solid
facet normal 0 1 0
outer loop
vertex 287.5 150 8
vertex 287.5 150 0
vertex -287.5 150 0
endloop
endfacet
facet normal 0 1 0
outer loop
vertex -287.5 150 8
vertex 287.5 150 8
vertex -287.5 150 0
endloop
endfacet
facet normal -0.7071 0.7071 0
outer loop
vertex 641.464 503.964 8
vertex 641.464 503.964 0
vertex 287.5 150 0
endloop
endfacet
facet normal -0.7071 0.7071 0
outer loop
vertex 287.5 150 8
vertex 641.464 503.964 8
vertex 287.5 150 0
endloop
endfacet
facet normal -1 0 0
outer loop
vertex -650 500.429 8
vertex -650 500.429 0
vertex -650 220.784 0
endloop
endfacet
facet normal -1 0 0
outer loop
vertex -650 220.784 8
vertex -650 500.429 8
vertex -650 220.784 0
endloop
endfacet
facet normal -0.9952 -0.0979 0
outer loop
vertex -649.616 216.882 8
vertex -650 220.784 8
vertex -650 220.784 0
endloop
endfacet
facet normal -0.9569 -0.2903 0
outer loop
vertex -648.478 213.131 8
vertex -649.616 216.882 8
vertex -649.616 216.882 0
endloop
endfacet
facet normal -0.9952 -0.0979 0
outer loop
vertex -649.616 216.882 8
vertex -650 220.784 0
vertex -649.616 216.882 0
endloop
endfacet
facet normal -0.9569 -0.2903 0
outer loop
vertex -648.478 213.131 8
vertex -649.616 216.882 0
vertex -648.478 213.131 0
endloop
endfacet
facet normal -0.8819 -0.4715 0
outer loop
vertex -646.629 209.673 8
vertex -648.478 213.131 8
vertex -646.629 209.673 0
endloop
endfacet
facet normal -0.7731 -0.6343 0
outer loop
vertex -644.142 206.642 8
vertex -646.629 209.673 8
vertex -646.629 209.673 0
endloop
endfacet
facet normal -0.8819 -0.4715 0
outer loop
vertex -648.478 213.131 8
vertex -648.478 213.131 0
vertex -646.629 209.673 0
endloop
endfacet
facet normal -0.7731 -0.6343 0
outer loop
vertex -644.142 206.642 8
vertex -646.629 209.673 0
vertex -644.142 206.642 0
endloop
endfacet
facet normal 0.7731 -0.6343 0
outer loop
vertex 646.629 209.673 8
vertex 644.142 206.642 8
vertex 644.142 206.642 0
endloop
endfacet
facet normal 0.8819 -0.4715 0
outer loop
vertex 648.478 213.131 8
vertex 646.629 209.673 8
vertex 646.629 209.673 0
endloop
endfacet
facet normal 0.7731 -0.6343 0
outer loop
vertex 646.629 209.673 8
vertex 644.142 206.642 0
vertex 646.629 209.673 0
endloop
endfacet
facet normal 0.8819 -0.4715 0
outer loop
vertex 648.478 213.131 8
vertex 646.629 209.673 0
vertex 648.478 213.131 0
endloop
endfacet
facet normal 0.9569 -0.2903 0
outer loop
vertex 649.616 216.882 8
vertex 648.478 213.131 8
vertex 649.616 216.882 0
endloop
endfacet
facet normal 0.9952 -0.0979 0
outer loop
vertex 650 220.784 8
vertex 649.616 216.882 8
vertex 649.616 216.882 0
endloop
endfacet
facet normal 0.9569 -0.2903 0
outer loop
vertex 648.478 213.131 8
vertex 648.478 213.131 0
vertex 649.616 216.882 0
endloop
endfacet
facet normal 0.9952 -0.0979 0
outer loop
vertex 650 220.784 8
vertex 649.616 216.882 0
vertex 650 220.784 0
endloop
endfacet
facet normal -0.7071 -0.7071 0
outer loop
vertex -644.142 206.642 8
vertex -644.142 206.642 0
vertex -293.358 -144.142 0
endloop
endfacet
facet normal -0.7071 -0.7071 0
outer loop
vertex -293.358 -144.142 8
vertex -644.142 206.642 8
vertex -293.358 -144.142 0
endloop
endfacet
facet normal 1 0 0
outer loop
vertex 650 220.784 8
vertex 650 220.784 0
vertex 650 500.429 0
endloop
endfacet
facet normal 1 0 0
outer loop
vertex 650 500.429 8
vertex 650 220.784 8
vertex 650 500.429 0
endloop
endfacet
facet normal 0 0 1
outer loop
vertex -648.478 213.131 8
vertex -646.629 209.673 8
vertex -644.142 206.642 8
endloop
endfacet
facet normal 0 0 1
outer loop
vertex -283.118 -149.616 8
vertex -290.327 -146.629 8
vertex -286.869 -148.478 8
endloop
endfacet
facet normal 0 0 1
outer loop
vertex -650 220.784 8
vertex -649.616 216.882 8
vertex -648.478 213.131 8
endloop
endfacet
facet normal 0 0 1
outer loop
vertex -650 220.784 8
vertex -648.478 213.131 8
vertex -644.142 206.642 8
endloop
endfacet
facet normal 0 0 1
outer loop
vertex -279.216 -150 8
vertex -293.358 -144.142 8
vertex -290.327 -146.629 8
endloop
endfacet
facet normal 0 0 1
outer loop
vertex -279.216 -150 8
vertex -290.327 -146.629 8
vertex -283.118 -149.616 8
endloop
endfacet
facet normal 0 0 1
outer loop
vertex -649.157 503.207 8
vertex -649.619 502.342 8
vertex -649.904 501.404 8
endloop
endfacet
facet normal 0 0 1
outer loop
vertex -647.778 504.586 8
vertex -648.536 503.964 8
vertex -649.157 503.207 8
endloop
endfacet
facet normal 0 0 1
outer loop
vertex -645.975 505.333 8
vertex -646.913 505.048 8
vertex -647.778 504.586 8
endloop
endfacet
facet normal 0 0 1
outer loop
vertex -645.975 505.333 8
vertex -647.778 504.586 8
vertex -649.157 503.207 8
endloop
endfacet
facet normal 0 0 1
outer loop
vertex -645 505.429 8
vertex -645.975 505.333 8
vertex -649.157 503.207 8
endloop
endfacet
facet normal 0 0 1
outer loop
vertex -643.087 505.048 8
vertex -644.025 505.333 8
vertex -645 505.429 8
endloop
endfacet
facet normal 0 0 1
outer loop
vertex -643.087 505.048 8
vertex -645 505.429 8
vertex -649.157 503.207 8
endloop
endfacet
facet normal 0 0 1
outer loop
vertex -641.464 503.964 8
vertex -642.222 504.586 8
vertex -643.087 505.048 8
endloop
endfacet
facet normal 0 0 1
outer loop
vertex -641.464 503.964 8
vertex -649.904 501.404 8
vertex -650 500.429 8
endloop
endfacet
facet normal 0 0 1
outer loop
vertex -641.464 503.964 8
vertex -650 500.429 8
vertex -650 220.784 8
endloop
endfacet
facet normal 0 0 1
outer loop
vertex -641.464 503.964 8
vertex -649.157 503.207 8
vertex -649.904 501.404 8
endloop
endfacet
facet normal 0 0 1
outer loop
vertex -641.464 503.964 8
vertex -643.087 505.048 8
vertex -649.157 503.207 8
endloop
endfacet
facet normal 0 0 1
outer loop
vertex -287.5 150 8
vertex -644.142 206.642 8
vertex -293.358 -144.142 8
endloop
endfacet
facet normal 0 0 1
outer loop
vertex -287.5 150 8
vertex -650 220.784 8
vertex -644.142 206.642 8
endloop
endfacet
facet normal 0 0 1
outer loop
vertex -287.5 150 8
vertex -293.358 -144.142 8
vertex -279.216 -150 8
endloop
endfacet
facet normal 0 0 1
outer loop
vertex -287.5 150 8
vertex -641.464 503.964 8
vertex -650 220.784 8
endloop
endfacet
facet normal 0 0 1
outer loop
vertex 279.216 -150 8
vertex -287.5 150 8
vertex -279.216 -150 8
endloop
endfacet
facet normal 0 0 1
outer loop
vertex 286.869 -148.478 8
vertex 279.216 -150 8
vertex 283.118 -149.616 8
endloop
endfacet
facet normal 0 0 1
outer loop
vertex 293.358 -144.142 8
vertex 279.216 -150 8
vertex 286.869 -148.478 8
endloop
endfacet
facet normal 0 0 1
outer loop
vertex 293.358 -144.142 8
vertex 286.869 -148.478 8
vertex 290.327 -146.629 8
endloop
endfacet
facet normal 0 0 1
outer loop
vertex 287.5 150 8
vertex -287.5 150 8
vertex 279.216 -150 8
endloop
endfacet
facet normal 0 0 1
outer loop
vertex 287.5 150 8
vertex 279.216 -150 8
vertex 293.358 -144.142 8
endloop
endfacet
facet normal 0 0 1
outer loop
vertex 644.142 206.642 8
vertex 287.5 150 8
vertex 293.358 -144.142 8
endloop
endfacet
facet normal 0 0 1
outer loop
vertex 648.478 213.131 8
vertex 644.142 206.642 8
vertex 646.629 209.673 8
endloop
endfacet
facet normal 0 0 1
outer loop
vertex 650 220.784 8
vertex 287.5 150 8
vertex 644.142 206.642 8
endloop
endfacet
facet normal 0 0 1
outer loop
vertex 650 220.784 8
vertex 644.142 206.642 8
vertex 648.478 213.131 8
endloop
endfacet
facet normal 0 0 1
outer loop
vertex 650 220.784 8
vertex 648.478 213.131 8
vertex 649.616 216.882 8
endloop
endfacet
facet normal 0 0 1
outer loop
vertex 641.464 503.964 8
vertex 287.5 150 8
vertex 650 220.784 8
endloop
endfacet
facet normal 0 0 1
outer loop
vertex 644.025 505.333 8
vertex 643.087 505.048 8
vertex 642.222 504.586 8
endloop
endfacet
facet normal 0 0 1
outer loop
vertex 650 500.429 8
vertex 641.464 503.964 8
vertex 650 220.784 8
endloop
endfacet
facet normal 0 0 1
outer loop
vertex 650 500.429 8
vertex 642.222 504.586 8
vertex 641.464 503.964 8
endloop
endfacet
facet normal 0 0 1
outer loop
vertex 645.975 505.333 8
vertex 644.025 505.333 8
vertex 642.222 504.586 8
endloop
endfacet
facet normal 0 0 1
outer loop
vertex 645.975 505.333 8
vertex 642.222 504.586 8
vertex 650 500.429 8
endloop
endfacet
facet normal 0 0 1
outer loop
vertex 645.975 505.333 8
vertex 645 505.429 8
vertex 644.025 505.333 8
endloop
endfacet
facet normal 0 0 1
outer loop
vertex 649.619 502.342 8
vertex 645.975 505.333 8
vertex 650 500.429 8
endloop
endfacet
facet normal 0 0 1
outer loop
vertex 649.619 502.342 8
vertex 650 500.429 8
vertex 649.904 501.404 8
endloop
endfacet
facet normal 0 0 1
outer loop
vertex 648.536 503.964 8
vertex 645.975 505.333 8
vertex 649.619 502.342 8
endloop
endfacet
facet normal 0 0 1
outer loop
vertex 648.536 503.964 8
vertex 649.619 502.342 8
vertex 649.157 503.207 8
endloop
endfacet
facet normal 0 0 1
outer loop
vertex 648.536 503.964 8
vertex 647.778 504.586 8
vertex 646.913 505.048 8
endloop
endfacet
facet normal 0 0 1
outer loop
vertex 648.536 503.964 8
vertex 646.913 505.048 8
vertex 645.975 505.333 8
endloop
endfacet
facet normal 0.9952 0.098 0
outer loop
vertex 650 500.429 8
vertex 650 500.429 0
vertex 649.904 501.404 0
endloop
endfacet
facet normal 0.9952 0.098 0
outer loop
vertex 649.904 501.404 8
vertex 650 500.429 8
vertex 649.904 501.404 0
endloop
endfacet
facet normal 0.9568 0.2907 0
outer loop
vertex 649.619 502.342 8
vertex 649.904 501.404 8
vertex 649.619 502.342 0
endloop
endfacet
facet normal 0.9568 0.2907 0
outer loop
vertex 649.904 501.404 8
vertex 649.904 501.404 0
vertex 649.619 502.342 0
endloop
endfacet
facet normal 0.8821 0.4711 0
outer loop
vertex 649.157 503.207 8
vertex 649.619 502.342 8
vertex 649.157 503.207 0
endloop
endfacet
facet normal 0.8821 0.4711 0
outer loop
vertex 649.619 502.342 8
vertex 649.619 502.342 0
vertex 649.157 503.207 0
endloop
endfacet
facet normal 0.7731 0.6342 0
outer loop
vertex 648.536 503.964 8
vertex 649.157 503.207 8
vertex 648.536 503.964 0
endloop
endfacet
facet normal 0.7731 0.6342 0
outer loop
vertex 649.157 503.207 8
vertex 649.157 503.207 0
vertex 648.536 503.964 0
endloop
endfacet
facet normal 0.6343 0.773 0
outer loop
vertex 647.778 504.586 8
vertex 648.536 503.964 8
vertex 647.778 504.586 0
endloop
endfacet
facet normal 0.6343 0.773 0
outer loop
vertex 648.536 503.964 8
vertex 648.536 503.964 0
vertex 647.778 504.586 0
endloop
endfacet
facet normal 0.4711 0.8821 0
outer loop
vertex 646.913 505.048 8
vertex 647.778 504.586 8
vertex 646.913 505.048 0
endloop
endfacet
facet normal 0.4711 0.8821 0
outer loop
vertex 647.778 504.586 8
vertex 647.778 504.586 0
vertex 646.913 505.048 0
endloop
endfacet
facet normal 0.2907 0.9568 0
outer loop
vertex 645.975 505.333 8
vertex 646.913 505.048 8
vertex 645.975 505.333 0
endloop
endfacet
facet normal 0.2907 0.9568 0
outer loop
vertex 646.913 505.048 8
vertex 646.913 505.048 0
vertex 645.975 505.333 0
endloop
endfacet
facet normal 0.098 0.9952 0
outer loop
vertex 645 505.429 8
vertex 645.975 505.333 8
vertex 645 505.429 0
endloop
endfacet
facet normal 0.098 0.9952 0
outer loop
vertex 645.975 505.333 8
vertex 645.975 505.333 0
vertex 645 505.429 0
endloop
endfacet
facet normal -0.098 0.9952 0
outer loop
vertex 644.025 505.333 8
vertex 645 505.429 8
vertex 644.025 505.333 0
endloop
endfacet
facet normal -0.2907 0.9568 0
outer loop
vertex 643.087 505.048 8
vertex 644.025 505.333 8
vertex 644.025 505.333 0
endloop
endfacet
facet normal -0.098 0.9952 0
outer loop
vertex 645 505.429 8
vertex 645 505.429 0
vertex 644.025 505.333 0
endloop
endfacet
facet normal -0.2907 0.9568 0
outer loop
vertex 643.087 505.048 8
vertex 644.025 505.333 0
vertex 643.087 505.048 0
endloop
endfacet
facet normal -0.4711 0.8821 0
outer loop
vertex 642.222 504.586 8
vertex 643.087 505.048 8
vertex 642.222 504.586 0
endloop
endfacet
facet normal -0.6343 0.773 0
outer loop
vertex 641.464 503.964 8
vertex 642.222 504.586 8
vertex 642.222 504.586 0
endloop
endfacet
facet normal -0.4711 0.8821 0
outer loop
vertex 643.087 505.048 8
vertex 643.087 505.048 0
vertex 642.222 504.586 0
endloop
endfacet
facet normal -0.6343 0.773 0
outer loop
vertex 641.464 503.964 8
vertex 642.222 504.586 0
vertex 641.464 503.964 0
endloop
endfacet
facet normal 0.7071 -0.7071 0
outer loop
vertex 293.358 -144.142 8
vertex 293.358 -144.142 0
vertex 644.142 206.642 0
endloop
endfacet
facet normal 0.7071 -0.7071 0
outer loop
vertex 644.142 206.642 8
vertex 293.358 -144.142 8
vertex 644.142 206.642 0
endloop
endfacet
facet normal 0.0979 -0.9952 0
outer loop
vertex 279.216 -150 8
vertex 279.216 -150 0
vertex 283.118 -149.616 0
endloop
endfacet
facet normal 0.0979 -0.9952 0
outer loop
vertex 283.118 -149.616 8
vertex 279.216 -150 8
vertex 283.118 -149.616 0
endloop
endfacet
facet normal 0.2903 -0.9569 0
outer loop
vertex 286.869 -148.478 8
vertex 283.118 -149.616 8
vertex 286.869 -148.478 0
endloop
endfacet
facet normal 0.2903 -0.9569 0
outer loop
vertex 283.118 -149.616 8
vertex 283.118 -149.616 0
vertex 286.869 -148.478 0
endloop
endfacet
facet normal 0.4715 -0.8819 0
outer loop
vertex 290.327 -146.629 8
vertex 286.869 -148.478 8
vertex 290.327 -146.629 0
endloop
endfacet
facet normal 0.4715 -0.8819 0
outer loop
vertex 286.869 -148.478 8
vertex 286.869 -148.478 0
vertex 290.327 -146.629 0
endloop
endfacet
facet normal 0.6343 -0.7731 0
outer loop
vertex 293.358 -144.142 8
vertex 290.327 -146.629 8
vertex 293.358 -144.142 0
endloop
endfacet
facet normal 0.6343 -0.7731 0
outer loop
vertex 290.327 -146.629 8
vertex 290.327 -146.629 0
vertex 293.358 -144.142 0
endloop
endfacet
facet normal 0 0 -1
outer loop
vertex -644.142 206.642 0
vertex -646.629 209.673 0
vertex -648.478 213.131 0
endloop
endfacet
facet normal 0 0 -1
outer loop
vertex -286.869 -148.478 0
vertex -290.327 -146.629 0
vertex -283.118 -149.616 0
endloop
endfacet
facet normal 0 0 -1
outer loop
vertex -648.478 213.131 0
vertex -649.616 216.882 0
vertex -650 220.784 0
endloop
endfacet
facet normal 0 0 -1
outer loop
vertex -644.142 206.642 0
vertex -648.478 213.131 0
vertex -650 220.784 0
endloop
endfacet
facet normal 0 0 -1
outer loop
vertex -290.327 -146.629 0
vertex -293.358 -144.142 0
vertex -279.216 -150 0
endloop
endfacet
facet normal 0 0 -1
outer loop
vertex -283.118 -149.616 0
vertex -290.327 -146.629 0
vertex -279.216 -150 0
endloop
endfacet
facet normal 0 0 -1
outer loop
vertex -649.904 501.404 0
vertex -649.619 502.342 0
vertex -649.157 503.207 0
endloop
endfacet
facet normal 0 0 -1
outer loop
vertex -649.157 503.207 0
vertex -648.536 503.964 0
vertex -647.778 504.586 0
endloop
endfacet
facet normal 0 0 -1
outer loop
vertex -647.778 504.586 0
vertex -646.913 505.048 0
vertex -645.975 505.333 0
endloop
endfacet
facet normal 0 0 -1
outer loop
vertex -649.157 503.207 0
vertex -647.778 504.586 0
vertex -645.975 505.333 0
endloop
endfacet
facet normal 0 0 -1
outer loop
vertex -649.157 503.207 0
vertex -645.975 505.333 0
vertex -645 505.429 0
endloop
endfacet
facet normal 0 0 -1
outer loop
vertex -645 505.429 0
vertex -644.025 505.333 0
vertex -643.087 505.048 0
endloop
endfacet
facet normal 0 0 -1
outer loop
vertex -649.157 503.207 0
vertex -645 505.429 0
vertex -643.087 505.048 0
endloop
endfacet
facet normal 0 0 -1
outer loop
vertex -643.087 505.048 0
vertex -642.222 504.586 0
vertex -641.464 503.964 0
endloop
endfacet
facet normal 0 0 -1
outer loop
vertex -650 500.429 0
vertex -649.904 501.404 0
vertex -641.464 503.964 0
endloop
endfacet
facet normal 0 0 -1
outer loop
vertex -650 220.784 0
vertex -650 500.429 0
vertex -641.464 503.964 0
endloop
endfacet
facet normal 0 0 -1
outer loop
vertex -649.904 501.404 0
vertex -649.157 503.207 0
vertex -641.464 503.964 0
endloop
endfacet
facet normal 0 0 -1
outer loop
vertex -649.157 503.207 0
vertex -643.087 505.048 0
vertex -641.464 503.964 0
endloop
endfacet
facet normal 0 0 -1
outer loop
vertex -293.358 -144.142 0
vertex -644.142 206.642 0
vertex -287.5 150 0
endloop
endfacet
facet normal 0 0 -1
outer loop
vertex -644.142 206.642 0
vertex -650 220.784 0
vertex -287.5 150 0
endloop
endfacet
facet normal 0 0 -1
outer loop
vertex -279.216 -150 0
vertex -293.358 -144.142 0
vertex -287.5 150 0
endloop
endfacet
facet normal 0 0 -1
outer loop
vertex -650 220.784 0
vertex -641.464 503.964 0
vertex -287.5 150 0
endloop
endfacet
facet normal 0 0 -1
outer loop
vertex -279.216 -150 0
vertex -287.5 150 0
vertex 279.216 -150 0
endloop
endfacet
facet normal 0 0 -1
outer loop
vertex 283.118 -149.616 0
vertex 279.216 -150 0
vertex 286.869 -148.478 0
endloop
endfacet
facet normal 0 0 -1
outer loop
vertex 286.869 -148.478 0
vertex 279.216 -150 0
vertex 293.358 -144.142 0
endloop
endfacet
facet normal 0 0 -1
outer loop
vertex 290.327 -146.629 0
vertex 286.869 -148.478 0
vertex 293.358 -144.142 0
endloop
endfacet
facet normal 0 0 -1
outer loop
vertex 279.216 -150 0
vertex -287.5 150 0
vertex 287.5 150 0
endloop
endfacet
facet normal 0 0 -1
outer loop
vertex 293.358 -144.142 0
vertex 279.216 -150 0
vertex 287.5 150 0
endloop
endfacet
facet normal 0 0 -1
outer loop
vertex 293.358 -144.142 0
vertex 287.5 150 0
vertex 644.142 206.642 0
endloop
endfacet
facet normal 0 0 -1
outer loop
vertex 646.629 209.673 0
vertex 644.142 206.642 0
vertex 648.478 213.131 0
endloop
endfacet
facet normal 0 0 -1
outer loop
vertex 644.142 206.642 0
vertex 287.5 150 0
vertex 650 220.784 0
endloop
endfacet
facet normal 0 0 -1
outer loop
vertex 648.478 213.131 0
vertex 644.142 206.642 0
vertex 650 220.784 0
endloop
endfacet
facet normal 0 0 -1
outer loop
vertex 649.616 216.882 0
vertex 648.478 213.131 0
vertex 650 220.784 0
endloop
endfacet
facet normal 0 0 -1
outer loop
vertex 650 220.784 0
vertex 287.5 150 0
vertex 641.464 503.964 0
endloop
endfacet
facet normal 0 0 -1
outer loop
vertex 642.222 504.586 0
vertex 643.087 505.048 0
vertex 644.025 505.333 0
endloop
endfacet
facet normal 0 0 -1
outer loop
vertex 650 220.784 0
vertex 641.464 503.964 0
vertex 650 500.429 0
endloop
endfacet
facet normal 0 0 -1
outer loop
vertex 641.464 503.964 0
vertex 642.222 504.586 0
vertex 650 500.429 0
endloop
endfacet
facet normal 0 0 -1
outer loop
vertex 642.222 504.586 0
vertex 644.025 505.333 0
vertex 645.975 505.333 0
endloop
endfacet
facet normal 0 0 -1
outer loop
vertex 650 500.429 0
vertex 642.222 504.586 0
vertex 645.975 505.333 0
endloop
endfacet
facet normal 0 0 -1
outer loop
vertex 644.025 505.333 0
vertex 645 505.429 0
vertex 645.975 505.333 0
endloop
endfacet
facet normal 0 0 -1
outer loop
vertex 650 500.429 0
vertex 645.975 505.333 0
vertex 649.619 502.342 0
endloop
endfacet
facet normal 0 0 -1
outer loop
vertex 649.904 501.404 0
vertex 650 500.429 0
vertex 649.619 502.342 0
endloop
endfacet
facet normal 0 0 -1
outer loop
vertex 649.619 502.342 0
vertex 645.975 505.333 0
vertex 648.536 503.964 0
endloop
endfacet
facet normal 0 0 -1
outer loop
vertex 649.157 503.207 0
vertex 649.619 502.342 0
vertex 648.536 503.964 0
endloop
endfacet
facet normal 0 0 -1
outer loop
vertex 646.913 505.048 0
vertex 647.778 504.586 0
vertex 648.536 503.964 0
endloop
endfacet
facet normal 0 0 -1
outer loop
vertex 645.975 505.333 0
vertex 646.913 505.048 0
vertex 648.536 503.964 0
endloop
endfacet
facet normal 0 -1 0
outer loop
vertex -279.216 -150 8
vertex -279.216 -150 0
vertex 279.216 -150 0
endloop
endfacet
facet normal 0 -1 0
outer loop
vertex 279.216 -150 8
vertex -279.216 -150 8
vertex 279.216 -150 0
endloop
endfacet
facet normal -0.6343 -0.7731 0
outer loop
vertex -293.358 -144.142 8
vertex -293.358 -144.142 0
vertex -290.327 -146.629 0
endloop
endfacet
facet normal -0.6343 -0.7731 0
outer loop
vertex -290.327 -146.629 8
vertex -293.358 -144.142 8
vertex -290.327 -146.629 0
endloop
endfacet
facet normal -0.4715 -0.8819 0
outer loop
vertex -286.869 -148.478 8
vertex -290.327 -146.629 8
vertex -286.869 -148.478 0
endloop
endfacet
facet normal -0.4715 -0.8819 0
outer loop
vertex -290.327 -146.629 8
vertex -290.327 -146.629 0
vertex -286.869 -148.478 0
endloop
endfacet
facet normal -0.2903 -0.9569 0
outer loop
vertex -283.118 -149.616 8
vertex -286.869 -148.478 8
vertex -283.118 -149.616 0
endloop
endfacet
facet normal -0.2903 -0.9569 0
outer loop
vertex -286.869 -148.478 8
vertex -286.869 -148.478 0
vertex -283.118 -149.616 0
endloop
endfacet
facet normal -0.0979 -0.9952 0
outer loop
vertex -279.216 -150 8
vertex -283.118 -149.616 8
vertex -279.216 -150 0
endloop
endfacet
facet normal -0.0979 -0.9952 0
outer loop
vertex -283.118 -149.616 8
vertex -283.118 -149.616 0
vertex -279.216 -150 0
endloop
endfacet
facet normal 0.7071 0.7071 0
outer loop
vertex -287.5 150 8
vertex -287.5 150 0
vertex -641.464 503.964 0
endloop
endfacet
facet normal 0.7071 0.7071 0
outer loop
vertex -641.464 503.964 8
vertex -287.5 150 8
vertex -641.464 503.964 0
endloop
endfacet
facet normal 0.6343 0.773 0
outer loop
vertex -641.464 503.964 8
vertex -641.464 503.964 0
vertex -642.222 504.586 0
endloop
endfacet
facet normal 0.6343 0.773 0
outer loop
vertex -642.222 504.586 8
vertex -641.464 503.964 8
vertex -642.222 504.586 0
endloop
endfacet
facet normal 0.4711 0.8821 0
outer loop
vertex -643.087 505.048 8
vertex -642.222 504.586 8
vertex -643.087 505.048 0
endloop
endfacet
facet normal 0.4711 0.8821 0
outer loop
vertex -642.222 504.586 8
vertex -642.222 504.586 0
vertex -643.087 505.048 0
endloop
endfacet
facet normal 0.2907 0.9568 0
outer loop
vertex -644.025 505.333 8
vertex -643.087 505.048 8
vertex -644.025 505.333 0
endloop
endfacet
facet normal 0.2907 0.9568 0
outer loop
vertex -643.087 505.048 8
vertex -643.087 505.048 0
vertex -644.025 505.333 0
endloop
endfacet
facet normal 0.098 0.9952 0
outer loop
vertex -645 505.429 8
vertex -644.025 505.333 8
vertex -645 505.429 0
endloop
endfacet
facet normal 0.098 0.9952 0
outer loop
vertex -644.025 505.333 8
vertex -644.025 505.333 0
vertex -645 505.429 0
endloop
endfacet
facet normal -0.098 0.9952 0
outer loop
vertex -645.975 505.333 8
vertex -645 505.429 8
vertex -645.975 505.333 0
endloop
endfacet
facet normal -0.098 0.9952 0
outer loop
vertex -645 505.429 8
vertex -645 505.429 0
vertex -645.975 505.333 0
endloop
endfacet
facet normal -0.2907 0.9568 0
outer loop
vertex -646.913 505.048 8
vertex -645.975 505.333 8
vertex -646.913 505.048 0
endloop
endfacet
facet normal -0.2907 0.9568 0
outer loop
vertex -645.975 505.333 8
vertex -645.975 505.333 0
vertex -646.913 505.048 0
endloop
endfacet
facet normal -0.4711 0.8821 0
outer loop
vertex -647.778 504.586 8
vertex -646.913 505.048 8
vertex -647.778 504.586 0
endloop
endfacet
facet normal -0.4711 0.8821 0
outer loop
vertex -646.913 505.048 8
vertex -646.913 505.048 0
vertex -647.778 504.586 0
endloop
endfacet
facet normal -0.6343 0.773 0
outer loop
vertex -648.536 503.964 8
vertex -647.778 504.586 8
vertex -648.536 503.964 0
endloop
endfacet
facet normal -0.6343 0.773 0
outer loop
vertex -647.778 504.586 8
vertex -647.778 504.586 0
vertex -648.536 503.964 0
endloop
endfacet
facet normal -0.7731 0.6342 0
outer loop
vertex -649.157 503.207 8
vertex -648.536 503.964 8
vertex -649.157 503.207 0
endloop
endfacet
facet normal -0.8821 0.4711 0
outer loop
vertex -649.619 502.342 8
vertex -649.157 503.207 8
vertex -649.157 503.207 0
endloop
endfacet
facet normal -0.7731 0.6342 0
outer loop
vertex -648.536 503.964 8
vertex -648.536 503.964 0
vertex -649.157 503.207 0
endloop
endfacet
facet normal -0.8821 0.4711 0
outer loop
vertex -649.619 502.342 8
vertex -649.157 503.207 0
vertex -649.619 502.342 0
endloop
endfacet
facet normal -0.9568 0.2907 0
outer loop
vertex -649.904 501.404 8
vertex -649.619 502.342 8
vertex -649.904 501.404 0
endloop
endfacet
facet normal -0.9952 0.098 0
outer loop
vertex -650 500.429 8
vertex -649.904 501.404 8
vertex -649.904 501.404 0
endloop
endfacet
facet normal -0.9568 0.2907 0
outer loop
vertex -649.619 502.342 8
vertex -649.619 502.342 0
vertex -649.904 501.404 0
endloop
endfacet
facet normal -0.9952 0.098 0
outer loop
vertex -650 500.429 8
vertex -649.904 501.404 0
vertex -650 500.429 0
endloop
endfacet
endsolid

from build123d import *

# Parameters (mm, degrees)
F1_DEPTH = 8


with BuildPart() as f1:
    # F0 (on Top) → F1 (new body)
    with BuildSketch(Plane.XY):
        with BuildLine():
            Line((287.5, 150), (-287.5, 150))
            Line((-287.5, 150), (-641.464466, 503.964466))
            ThreePointArc((-641.464466, 503.964466), (-646.913417, 505.04833), (-650, 500.428932))
            Line((-650, 500.428932), (-650, 220.784271))
            ThreePointArc((-650, 220.784271), (-648.477591, 213.130603), (-644.142136, 206.642136))
            Line((-644.142136, 206.642136), (-293.357864, -144.142136))
            ThreePointArc((-293.357864, -144.142136), (-286.869397, -148.477591), (-279.215729, -150))
            Line((-279.215729, -150), (279.215729, -150))
            ThreePointArc((279.215729, -150), (286.869397, -148.477591), (293.357864, -144.142136))
            Line((293.357864, -144.142136), (644.142136, 206.642136))
            ThreePointArc((644.142136, 206.642136), (648.477591, 213.130603), (650, 220.784271))
            Line((650, 220.784271), (650, 500.428932))
            ThreePointArc((650, 500.428932), (646.913417, 505.04833), (641.464466, 503.964466))
            Line((641.464466, 503.964466), (287.5, 150))
        make_face()
    extrude(amount=F1_DEPTH)


solid = f1.part
